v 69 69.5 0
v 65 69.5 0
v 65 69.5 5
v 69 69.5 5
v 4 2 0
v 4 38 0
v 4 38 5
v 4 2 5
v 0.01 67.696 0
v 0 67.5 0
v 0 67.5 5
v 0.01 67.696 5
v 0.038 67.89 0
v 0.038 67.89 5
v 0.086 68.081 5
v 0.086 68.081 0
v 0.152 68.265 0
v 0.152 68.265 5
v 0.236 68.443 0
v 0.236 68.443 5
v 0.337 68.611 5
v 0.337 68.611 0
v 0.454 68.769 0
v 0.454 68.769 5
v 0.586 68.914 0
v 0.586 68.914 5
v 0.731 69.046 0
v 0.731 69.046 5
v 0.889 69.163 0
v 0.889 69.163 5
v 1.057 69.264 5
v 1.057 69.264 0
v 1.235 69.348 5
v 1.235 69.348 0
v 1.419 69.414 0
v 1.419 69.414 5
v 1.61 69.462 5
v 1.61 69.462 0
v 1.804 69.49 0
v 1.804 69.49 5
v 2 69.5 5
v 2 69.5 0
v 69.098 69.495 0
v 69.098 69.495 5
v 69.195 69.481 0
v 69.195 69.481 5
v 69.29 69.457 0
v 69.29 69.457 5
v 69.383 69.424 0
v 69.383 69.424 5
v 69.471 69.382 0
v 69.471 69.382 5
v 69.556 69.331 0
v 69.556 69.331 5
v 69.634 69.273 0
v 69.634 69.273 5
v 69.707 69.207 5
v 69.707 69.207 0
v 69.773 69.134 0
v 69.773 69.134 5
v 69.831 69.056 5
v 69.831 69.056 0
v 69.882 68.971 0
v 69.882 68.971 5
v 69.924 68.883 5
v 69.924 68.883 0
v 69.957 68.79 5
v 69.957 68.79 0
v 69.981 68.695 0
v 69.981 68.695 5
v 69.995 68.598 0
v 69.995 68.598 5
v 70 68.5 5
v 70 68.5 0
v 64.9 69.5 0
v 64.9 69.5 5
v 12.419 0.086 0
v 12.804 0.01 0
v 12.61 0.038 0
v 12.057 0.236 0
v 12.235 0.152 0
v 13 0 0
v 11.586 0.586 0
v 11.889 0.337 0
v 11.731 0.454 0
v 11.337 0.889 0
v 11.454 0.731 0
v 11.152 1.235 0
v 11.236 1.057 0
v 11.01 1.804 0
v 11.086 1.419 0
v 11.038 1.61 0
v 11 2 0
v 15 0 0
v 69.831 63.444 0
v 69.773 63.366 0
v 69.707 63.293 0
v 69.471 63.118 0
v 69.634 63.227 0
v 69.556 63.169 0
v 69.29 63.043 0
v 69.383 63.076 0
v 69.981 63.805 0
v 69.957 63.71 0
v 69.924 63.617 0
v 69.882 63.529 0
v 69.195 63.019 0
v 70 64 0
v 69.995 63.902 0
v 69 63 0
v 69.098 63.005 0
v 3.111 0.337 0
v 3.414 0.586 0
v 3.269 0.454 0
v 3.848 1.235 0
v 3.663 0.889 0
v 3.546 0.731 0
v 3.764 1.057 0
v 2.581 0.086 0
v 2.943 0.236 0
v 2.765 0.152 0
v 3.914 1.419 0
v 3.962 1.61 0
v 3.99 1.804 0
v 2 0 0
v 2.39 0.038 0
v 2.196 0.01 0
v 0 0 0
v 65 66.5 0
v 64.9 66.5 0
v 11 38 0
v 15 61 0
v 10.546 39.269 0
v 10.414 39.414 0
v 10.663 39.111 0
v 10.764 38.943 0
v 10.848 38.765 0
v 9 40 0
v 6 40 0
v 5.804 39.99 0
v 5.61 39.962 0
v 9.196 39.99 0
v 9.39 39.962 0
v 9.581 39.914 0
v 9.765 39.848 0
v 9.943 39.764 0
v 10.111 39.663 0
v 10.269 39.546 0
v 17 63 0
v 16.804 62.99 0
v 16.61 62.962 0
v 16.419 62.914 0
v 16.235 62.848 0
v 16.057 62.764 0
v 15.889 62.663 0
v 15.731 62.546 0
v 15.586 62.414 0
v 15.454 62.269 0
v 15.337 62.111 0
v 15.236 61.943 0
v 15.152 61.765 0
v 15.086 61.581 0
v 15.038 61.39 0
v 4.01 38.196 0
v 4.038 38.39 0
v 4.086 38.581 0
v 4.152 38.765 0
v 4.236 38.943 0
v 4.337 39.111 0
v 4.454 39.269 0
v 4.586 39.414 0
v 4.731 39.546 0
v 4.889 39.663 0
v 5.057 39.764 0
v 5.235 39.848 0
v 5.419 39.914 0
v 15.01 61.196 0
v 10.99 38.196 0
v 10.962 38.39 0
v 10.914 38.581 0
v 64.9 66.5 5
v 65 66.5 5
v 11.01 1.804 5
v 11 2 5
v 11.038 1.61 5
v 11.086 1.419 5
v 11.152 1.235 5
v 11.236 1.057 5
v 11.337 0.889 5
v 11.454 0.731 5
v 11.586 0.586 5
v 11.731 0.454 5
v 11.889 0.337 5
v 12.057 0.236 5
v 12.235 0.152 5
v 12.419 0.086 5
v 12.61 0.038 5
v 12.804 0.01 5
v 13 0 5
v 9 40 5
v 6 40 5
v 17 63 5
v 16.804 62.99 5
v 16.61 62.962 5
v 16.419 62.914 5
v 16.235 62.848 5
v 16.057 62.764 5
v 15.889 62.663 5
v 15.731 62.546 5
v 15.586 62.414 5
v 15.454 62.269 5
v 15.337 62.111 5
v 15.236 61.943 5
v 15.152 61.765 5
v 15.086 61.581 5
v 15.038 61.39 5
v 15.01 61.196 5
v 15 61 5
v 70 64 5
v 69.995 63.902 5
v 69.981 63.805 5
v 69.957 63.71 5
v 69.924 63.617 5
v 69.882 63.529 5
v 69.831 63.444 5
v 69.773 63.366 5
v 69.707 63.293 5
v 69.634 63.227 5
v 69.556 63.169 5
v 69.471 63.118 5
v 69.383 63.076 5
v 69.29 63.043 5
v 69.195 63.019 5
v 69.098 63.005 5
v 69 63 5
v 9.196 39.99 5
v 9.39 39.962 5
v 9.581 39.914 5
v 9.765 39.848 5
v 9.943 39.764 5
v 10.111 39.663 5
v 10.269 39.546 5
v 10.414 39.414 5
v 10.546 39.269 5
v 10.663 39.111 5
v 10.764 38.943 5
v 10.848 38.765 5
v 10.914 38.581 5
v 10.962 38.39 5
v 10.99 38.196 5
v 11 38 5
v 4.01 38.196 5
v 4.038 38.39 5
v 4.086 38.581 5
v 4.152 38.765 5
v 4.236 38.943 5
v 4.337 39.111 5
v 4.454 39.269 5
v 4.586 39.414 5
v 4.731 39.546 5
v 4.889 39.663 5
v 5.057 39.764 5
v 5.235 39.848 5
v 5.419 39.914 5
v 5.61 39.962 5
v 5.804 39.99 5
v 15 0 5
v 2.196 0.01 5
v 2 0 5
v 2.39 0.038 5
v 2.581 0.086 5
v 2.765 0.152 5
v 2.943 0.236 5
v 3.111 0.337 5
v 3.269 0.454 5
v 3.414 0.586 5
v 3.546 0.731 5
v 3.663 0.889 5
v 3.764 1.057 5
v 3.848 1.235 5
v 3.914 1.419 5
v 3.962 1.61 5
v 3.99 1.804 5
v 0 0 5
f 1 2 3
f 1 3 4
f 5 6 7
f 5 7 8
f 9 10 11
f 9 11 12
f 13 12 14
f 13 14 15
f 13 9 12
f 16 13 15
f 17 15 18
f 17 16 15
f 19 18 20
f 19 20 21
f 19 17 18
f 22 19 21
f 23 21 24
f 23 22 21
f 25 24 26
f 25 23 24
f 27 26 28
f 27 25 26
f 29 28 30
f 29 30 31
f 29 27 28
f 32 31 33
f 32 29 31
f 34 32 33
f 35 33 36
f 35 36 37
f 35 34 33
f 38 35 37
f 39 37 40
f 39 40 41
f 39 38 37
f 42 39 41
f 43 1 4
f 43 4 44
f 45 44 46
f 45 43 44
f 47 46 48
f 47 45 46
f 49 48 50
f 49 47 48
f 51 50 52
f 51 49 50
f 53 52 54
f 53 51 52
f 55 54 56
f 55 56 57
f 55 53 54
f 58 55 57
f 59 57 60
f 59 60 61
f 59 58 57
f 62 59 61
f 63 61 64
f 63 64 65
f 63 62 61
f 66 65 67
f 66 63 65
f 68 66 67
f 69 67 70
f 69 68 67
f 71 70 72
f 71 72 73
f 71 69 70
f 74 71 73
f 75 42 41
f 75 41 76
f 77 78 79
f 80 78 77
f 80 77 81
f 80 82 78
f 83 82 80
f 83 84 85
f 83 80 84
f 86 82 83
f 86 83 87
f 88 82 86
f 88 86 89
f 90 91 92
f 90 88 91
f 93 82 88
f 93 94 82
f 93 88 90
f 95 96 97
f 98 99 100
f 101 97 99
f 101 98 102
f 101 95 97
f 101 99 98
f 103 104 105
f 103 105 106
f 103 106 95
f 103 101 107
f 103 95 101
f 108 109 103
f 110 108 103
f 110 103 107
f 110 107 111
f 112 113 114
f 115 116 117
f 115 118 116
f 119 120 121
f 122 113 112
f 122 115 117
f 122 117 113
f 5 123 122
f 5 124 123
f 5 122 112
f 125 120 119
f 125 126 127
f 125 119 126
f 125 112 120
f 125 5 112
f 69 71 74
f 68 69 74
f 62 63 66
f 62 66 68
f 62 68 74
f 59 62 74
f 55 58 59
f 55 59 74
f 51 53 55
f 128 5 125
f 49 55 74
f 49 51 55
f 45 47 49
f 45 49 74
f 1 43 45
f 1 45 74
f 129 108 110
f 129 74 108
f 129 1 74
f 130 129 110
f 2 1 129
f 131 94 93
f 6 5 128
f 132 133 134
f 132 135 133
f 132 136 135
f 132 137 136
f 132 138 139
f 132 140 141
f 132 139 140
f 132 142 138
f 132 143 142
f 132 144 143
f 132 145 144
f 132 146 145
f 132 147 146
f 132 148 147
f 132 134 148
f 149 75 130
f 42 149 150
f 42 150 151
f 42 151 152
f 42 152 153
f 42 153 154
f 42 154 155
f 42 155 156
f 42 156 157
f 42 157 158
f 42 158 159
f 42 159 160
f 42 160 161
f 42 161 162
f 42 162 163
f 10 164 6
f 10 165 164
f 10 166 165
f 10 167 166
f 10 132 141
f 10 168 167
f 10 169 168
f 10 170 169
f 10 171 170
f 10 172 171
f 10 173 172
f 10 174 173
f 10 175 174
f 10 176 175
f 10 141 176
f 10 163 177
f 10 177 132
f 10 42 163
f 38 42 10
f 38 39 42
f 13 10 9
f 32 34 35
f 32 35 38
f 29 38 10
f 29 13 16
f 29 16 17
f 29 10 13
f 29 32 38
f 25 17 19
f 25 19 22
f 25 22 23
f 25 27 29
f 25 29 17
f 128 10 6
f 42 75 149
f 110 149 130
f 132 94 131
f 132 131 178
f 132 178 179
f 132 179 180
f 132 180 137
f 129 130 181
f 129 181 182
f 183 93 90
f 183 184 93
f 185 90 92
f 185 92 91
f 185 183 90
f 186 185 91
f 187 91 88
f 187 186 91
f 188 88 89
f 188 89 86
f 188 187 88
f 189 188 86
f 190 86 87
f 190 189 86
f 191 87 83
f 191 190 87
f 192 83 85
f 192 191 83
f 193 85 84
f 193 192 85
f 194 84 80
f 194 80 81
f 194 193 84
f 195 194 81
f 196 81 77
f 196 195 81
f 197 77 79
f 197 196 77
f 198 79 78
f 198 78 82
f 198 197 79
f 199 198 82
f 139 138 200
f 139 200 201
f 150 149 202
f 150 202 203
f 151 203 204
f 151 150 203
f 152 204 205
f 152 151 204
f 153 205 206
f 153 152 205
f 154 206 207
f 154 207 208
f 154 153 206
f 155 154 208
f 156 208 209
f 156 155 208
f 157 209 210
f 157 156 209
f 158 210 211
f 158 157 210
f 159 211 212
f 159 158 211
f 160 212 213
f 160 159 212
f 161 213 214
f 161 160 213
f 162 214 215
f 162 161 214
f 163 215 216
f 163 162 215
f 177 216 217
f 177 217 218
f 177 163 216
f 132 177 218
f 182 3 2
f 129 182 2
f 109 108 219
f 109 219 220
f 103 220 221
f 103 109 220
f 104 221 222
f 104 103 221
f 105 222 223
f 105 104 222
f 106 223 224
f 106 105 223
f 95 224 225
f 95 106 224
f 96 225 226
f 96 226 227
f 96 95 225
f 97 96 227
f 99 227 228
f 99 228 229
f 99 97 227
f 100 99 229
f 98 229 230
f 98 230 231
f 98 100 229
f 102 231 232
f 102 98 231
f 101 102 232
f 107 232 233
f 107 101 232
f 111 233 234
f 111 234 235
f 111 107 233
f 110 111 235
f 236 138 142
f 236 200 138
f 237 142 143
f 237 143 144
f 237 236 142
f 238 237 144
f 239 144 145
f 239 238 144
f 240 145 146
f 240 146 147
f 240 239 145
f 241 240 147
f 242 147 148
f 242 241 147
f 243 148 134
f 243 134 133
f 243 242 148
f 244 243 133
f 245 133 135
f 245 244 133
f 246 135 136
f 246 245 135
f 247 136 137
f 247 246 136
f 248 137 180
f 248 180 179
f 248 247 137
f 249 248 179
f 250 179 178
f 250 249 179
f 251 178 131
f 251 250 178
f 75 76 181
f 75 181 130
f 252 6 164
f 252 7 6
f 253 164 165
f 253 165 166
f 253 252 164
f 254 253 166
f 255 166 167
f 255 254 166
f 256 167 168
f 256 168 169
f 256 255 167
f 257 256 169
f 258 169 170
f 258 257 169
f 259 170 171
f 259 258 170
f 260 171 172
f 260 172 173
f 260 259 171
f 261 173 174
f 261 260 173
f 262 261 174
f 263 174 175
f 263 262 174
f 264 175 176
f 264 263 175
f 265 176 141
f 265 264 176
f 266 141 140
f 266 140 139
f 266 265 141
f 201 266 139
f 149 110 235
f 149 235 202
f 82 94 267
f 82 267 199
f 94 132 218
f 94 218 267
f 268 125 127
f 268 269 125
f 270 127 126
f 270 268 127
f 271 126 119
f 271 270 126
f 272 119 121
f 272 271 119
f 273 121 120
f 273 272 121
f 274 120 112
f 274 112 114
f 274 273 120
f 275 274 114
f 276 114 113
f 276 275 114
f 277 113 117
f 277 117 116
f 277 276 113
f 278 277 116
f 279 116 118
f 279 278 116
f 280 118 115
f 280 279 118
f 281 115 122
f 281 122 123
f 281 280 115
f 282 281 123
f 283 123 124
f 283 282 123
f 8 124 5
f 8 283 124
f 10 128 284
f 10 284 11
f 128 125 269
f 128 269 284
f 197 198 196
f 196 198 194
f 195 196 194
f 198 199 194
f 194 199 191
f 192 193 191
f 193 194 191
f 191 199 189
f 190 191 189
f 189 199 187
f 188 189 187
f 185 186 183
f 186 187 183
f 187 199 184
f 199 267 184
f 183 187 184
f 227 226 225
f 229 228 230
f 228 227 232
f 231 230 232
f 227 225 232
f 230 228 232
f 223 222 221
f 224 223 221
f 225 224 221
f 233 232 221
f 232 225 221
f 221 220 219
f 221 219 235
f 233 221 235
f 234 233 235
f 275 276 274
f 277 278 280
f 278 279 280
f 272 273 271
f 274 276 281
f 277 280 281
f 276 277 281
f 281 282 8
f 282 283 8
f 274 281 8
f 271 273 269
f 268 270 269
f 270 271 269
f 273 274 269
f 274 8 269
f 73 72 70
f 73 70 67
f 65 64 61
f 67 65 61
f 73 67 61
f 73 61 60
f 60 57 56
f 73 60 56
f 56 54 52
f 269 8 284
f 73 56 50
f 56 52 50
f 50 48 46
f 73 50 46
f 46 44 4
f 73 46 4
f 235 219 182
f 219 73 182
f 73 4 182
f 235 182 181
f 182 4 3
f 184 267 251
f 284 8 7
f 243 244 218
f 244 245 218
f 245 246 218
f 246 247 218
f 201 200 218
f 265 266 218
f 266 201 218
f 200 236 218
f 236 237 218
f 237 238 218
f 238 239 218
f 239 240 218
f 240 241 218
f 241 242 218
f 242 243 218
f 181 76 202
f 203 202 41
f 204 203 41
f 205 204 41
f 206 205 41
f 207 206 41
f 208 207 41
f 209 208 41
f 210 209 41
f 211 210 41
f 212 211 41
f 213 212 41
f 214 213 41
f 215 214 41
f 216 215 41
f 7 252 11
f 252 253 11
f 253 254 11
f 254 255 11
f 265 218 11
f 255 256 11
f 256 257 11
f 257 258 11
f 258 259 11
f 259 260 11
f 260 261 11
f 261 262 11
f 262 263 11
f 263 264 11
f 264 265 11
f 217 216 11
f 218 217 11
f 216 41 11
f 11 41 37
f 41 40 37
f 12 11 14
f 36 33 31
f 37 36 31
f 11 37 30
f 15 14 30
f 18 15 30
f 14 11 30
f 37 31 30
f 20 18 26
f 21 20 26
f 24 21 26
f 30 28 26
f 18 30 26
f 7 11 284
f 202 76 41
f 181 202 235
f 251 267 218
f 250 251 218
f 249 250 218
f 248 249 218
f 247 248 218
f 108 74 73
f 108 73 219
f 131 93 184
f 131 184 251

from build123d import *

# Parameters (mm, degrees)
BOSS_EXTRUDE1_DEPTH = 5
SKETCH3_W           = 0.1
SKETCH3_H           = 5
CUT_EXTRUDE1_DEPTH  = 3
FILLET1_R           = 2


with BuildPart() as part:
    # Sketch1 → Boss-Extrude1 (new body)
    with BuildSketch(Plane.XY):
        with BuildLine():
            Line((0, 0), (0, 67.5))
            ThreePointArc((0, 67.5), (0.585786438, 68.914213562), (2, 69.5))
            Line((2, 69.5), (69, 69.5))
            ThreePointArc((69, 69.5), (69.707106781, 69.207106781), (70, 68.5))
            Line((70, 68.5), (70, 64))
            ThreePointArc((70, 64), (69.707106781, 63.292893219), (69, 63))
            Line((69, 63), (17, 63))
            ThreePointArc((17, 63), (15.585786438, 62.414213562), (15, 61))
            Line((15, 61), (15, 0))
            Line((15, 0), (11, 0))
            Line((11, 0), (11, 40))
            Line((11, 40), (4, 40))
            Line((4, 40), (4, 0))
            Line((4, 0), (0, 0))
        make_face()
    extrude(amount=BOSS_EXTRUDE1_DEPTH)

    # Sketch3 → Cut-Extrude1 (cut)
    with BuildSketch(Plane(origin=(0, 69.5, 0), x_dir=(1, 0, 0), z_dir=(0, 1, 0))):
        with Locations((64.95, -2.5)):
            Rectangle(SKETCH3_W, SKETCH3_H)
    extrude(amount=-CUT_EXTRUDE1_DEPTH, mode=Mode.SUBTRACT)

    # Fillet1
    fillet1_edges = [part.edges().sort_by_distance(p)[0] for p in [
        (11, 0, 2.5),
        (11, 40, 2.5),
        (4, 40, 2.5),
        (4, 0, 2.5),
    ]]
    fillet(fillet1_edges, radius=FILLET1_R)


solid = part.part
